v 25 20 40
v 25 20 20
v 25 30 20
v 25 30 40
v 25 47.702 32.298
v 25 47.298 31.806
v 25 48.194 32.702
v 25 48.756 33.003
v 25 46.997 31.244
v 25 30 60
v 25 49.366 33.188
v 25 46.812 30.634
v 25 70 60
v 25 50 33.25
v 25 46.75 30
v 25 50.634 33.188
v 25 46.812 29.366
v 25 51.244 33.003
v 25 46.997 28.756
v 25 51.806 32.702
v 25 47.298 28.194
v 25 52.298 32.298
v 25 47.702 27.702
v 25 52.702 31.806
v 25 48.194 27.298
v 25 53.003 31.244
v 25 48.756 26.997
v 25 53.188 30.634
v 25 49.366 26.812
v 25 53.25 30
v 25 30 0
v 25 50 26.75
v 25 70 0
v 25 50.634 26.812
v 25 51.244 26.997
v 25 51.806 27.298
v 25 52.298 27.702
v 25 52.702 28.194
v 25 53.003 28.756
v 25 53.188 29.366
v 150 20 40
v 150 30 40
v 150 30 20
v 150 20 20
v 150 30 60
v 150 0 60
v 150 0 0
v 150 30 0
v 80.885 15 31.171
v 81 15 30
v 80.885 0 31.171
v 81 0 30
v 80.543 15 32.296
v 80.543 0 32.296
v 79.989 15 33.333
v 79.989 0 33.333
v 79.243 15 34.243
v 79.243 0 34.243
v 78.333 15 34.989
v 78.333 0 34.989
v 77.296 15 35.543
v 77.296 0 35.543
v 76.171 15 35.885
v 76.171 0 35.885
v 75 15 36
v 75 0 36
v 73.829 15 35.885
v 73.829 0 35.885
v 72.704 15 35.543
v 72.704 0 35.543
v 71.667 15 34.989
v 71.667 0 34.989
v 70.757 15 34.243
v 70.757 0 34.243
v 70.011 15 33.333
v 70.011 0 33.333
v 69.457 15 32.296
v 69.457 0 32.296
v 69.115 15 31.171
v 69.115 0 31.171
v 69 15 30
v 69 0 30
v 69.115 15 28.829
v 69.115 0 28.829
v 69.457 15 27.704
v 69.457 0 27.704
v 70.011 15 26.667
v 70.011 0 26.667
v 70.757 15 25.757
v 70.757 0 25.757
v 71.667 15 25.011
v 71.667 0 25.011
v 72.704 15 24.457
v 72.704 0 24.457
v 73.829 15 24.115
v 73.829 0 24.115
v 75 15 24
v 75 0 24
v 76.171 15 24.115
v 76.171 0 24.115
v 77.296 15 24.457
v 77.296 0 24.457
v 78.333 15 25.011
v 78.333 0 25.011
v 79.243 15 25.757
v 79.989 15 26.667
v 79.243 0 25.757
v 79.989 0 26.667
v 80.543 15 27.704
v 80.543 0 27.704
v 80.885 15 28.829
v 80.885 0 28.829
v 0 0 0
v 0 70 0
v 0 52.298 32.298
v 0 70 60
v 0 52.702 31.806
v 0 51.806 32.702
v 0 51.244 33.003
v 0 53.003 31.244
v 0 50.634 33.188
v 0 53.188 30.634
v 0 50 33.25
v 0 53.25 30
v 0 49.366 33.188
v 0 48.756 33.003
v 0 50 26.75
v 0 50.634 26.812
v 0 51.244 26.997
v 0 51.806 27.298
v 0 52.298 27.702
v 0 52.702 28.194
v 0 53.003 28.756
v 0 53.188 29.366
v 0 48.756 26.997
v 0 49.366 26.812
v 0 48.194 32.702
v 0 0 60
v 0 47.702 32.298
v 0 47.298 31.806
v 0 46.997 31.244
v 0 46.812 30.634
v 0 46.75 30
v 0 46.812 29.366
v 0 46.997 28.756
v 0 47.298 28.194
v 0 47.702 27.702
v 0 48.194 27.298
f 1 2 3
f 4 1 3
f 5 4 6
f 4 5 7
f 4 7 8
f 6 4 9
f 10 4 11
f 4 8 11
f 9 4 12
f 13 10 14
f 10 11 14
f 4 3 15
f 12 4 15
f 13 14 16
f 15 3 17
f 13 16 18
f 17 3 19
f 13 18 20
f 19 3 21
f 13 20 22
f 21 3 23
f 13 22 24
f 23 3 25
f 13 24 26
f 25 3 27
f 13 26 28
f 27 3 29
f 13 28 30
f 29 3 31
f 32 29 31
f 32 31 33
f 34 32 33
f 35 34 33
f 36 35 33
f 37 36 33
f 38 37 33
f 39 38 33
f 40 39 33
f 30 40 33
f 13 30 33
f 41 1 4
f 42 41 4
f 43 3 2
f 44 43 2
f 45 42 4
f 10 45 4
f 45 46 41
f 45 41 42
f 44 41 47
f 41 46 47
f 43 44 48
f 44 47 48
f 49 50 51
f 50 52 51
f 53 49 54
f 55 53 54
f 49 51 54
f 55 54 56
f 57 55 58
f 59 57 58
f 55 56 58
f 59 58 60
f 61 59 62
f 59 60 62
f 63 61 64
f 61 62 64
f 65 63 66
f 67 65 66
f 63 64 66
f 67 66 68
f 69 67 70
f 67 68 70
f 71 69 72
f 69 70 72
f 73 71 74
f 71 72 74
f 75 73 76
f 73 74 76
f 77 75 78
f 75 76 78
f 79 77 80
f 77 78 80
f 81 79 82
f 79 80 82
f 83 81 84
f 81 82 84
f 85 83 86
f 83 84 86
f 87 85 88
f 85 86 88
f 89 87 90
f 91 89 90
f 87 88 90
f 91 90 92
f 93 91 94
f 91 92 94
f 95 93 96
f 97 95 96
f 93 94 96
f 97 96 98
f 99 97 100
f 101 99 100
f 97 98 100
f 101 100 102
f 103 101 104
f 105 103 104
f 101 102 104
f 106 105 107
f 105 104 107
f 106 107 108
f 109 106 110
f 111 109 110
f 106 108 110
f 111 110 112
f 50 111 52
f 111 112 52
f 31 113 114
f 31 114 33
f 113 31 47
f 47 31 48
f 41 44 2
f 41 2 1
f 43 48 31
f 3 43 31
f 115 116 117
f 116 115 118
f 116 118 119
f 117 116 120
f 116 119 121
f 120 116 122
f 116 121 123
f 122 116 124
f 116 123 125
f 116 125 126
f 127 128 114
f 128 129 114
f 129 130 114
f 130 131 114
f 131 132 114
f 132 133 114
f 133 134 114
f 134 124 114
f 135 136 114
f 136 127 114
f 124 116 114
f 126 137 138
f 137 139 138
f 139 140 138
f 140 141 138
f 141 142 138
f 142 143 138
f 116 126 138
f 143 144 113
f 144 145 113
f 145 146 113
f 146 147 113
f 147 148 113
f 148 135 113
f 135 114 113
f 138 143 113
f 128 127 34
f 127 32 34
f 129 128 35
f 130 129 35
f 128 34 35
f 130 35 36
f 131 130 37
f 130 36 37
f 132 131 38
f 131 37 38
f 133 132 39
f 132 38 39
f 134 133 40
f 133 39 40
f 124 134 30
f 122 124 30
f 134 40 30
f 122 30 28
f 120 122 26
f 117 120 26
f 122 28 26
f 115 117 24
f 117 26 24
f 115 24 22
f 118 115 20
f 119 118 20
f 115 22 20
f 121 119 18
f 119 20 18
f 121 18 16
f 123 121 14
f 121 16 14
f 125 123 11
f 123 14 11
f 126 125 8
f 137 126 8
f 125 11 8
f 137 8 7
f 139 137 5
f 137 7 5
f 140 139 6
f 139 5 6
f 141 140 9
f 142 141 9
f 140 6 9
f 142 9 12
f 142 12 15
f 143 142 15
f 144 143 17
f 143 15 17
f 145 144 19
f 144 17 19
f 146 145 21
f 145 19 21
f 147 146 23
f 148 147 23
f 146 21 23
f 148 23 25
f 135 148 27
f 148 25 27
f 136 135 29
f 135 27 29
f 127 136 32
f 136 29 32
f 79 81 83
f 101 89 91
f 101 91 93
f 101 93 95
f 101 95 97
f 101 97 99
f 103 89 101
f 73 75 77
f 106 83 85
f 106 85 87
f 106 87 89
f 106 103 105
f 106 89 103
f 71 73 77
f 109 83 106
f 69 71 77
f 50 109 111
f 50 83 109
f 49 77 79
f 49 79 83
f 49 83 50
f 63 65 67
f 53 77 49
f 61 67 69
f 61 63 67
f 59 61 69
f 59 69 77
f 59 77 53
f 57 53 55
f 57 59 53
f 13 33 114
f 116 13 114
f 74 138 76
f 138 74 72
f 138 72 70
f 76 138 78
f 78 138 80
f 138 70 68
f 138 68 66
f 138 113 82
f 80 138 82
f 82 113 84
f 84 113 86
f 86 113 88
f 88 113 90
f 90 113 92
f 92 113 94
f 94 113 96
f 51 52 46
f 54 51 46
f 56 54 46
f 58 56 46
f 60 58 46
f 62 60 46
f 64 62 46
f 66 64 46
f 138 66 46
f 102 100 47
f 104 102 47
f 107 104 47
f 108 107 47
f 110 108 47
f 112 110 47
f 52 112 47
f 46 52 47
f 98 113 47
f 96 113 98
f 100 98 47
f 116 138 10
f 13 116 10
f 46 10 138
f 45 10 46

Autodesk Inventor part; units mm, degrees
ref_plane "YZ Plane" through (0, 0, 0) normal (1, 0, 0) x (0, 1, 0)
ref_plane "XZ Plane" through (0, 0, 0) normal (0, 1, 0) x (-1, 0, 0)
ref_plane "XY Plane" through (0, 0, 0) normal (0, 0, 1) x (1, 0, 0)
sketch "Sketch1" plane through (0, 0, 0) normal (0, 0, 1) x (1, 0, 0)
  line L0 (0, 0) -> (150, 0)
  line L1 (150, 0) -> (150, 30)
  line L2 (150, 30) -> (25, 30)
  line L3 (25, 30) -> (25, 70)
  line L4 (25, 70) -> (0, 70)
  line L5 (0, 70) -> (0, 0)
  dimension "d0" = 150
  dimension "d1" = 30
  dimension "d2" = 125
  dimension "d3" = 40
extrude "Extrusion1" add sketch "Sketch1" along normal blind 60
sketch "Sketch2" plane through (150, 0, 0) normal (1, 0, 0) x (0, 0, -1)
  line L0 (0, 30) -> (-60, 30) projected
  line L1 (-40, 30) -> (-20, 30)
  line L2 (-20, 30) -> (-20, 20)
  line L3 (-20, 20) -> (-40, 20)
  line L4 (-40, 20) -> (-40, 30)
  point P0 (0, 0)
  dimension "d6" = 20
  dimension "d7" = 10
extrude "Extrusion2" cut sketch "Sketch2" against normal blind 125
sketch "Sketch3" plane through (0, 0, 0) normal (0, -1, 0) x (1, 0, 0)
  circle A0 centre (75, 30) radius 6
  point P0 (0, 0)
  dimension "d10" = 12
extrude "Extrusion3" cut sketch "Sketch3" against normal blind 15
sketch "Sketch4" plane through (25, 30, 0) normal (1, 0, 0) x (0, 0, -1)
  circle A0 centre (-30, 20) radius 3.25
  point P0 (0, -30)
  dimension "d13" = 6.5
extrude "Extrusion4" cut sketch "Sketch4" against normal blind 47.5
properties part number "sabit_govde"
